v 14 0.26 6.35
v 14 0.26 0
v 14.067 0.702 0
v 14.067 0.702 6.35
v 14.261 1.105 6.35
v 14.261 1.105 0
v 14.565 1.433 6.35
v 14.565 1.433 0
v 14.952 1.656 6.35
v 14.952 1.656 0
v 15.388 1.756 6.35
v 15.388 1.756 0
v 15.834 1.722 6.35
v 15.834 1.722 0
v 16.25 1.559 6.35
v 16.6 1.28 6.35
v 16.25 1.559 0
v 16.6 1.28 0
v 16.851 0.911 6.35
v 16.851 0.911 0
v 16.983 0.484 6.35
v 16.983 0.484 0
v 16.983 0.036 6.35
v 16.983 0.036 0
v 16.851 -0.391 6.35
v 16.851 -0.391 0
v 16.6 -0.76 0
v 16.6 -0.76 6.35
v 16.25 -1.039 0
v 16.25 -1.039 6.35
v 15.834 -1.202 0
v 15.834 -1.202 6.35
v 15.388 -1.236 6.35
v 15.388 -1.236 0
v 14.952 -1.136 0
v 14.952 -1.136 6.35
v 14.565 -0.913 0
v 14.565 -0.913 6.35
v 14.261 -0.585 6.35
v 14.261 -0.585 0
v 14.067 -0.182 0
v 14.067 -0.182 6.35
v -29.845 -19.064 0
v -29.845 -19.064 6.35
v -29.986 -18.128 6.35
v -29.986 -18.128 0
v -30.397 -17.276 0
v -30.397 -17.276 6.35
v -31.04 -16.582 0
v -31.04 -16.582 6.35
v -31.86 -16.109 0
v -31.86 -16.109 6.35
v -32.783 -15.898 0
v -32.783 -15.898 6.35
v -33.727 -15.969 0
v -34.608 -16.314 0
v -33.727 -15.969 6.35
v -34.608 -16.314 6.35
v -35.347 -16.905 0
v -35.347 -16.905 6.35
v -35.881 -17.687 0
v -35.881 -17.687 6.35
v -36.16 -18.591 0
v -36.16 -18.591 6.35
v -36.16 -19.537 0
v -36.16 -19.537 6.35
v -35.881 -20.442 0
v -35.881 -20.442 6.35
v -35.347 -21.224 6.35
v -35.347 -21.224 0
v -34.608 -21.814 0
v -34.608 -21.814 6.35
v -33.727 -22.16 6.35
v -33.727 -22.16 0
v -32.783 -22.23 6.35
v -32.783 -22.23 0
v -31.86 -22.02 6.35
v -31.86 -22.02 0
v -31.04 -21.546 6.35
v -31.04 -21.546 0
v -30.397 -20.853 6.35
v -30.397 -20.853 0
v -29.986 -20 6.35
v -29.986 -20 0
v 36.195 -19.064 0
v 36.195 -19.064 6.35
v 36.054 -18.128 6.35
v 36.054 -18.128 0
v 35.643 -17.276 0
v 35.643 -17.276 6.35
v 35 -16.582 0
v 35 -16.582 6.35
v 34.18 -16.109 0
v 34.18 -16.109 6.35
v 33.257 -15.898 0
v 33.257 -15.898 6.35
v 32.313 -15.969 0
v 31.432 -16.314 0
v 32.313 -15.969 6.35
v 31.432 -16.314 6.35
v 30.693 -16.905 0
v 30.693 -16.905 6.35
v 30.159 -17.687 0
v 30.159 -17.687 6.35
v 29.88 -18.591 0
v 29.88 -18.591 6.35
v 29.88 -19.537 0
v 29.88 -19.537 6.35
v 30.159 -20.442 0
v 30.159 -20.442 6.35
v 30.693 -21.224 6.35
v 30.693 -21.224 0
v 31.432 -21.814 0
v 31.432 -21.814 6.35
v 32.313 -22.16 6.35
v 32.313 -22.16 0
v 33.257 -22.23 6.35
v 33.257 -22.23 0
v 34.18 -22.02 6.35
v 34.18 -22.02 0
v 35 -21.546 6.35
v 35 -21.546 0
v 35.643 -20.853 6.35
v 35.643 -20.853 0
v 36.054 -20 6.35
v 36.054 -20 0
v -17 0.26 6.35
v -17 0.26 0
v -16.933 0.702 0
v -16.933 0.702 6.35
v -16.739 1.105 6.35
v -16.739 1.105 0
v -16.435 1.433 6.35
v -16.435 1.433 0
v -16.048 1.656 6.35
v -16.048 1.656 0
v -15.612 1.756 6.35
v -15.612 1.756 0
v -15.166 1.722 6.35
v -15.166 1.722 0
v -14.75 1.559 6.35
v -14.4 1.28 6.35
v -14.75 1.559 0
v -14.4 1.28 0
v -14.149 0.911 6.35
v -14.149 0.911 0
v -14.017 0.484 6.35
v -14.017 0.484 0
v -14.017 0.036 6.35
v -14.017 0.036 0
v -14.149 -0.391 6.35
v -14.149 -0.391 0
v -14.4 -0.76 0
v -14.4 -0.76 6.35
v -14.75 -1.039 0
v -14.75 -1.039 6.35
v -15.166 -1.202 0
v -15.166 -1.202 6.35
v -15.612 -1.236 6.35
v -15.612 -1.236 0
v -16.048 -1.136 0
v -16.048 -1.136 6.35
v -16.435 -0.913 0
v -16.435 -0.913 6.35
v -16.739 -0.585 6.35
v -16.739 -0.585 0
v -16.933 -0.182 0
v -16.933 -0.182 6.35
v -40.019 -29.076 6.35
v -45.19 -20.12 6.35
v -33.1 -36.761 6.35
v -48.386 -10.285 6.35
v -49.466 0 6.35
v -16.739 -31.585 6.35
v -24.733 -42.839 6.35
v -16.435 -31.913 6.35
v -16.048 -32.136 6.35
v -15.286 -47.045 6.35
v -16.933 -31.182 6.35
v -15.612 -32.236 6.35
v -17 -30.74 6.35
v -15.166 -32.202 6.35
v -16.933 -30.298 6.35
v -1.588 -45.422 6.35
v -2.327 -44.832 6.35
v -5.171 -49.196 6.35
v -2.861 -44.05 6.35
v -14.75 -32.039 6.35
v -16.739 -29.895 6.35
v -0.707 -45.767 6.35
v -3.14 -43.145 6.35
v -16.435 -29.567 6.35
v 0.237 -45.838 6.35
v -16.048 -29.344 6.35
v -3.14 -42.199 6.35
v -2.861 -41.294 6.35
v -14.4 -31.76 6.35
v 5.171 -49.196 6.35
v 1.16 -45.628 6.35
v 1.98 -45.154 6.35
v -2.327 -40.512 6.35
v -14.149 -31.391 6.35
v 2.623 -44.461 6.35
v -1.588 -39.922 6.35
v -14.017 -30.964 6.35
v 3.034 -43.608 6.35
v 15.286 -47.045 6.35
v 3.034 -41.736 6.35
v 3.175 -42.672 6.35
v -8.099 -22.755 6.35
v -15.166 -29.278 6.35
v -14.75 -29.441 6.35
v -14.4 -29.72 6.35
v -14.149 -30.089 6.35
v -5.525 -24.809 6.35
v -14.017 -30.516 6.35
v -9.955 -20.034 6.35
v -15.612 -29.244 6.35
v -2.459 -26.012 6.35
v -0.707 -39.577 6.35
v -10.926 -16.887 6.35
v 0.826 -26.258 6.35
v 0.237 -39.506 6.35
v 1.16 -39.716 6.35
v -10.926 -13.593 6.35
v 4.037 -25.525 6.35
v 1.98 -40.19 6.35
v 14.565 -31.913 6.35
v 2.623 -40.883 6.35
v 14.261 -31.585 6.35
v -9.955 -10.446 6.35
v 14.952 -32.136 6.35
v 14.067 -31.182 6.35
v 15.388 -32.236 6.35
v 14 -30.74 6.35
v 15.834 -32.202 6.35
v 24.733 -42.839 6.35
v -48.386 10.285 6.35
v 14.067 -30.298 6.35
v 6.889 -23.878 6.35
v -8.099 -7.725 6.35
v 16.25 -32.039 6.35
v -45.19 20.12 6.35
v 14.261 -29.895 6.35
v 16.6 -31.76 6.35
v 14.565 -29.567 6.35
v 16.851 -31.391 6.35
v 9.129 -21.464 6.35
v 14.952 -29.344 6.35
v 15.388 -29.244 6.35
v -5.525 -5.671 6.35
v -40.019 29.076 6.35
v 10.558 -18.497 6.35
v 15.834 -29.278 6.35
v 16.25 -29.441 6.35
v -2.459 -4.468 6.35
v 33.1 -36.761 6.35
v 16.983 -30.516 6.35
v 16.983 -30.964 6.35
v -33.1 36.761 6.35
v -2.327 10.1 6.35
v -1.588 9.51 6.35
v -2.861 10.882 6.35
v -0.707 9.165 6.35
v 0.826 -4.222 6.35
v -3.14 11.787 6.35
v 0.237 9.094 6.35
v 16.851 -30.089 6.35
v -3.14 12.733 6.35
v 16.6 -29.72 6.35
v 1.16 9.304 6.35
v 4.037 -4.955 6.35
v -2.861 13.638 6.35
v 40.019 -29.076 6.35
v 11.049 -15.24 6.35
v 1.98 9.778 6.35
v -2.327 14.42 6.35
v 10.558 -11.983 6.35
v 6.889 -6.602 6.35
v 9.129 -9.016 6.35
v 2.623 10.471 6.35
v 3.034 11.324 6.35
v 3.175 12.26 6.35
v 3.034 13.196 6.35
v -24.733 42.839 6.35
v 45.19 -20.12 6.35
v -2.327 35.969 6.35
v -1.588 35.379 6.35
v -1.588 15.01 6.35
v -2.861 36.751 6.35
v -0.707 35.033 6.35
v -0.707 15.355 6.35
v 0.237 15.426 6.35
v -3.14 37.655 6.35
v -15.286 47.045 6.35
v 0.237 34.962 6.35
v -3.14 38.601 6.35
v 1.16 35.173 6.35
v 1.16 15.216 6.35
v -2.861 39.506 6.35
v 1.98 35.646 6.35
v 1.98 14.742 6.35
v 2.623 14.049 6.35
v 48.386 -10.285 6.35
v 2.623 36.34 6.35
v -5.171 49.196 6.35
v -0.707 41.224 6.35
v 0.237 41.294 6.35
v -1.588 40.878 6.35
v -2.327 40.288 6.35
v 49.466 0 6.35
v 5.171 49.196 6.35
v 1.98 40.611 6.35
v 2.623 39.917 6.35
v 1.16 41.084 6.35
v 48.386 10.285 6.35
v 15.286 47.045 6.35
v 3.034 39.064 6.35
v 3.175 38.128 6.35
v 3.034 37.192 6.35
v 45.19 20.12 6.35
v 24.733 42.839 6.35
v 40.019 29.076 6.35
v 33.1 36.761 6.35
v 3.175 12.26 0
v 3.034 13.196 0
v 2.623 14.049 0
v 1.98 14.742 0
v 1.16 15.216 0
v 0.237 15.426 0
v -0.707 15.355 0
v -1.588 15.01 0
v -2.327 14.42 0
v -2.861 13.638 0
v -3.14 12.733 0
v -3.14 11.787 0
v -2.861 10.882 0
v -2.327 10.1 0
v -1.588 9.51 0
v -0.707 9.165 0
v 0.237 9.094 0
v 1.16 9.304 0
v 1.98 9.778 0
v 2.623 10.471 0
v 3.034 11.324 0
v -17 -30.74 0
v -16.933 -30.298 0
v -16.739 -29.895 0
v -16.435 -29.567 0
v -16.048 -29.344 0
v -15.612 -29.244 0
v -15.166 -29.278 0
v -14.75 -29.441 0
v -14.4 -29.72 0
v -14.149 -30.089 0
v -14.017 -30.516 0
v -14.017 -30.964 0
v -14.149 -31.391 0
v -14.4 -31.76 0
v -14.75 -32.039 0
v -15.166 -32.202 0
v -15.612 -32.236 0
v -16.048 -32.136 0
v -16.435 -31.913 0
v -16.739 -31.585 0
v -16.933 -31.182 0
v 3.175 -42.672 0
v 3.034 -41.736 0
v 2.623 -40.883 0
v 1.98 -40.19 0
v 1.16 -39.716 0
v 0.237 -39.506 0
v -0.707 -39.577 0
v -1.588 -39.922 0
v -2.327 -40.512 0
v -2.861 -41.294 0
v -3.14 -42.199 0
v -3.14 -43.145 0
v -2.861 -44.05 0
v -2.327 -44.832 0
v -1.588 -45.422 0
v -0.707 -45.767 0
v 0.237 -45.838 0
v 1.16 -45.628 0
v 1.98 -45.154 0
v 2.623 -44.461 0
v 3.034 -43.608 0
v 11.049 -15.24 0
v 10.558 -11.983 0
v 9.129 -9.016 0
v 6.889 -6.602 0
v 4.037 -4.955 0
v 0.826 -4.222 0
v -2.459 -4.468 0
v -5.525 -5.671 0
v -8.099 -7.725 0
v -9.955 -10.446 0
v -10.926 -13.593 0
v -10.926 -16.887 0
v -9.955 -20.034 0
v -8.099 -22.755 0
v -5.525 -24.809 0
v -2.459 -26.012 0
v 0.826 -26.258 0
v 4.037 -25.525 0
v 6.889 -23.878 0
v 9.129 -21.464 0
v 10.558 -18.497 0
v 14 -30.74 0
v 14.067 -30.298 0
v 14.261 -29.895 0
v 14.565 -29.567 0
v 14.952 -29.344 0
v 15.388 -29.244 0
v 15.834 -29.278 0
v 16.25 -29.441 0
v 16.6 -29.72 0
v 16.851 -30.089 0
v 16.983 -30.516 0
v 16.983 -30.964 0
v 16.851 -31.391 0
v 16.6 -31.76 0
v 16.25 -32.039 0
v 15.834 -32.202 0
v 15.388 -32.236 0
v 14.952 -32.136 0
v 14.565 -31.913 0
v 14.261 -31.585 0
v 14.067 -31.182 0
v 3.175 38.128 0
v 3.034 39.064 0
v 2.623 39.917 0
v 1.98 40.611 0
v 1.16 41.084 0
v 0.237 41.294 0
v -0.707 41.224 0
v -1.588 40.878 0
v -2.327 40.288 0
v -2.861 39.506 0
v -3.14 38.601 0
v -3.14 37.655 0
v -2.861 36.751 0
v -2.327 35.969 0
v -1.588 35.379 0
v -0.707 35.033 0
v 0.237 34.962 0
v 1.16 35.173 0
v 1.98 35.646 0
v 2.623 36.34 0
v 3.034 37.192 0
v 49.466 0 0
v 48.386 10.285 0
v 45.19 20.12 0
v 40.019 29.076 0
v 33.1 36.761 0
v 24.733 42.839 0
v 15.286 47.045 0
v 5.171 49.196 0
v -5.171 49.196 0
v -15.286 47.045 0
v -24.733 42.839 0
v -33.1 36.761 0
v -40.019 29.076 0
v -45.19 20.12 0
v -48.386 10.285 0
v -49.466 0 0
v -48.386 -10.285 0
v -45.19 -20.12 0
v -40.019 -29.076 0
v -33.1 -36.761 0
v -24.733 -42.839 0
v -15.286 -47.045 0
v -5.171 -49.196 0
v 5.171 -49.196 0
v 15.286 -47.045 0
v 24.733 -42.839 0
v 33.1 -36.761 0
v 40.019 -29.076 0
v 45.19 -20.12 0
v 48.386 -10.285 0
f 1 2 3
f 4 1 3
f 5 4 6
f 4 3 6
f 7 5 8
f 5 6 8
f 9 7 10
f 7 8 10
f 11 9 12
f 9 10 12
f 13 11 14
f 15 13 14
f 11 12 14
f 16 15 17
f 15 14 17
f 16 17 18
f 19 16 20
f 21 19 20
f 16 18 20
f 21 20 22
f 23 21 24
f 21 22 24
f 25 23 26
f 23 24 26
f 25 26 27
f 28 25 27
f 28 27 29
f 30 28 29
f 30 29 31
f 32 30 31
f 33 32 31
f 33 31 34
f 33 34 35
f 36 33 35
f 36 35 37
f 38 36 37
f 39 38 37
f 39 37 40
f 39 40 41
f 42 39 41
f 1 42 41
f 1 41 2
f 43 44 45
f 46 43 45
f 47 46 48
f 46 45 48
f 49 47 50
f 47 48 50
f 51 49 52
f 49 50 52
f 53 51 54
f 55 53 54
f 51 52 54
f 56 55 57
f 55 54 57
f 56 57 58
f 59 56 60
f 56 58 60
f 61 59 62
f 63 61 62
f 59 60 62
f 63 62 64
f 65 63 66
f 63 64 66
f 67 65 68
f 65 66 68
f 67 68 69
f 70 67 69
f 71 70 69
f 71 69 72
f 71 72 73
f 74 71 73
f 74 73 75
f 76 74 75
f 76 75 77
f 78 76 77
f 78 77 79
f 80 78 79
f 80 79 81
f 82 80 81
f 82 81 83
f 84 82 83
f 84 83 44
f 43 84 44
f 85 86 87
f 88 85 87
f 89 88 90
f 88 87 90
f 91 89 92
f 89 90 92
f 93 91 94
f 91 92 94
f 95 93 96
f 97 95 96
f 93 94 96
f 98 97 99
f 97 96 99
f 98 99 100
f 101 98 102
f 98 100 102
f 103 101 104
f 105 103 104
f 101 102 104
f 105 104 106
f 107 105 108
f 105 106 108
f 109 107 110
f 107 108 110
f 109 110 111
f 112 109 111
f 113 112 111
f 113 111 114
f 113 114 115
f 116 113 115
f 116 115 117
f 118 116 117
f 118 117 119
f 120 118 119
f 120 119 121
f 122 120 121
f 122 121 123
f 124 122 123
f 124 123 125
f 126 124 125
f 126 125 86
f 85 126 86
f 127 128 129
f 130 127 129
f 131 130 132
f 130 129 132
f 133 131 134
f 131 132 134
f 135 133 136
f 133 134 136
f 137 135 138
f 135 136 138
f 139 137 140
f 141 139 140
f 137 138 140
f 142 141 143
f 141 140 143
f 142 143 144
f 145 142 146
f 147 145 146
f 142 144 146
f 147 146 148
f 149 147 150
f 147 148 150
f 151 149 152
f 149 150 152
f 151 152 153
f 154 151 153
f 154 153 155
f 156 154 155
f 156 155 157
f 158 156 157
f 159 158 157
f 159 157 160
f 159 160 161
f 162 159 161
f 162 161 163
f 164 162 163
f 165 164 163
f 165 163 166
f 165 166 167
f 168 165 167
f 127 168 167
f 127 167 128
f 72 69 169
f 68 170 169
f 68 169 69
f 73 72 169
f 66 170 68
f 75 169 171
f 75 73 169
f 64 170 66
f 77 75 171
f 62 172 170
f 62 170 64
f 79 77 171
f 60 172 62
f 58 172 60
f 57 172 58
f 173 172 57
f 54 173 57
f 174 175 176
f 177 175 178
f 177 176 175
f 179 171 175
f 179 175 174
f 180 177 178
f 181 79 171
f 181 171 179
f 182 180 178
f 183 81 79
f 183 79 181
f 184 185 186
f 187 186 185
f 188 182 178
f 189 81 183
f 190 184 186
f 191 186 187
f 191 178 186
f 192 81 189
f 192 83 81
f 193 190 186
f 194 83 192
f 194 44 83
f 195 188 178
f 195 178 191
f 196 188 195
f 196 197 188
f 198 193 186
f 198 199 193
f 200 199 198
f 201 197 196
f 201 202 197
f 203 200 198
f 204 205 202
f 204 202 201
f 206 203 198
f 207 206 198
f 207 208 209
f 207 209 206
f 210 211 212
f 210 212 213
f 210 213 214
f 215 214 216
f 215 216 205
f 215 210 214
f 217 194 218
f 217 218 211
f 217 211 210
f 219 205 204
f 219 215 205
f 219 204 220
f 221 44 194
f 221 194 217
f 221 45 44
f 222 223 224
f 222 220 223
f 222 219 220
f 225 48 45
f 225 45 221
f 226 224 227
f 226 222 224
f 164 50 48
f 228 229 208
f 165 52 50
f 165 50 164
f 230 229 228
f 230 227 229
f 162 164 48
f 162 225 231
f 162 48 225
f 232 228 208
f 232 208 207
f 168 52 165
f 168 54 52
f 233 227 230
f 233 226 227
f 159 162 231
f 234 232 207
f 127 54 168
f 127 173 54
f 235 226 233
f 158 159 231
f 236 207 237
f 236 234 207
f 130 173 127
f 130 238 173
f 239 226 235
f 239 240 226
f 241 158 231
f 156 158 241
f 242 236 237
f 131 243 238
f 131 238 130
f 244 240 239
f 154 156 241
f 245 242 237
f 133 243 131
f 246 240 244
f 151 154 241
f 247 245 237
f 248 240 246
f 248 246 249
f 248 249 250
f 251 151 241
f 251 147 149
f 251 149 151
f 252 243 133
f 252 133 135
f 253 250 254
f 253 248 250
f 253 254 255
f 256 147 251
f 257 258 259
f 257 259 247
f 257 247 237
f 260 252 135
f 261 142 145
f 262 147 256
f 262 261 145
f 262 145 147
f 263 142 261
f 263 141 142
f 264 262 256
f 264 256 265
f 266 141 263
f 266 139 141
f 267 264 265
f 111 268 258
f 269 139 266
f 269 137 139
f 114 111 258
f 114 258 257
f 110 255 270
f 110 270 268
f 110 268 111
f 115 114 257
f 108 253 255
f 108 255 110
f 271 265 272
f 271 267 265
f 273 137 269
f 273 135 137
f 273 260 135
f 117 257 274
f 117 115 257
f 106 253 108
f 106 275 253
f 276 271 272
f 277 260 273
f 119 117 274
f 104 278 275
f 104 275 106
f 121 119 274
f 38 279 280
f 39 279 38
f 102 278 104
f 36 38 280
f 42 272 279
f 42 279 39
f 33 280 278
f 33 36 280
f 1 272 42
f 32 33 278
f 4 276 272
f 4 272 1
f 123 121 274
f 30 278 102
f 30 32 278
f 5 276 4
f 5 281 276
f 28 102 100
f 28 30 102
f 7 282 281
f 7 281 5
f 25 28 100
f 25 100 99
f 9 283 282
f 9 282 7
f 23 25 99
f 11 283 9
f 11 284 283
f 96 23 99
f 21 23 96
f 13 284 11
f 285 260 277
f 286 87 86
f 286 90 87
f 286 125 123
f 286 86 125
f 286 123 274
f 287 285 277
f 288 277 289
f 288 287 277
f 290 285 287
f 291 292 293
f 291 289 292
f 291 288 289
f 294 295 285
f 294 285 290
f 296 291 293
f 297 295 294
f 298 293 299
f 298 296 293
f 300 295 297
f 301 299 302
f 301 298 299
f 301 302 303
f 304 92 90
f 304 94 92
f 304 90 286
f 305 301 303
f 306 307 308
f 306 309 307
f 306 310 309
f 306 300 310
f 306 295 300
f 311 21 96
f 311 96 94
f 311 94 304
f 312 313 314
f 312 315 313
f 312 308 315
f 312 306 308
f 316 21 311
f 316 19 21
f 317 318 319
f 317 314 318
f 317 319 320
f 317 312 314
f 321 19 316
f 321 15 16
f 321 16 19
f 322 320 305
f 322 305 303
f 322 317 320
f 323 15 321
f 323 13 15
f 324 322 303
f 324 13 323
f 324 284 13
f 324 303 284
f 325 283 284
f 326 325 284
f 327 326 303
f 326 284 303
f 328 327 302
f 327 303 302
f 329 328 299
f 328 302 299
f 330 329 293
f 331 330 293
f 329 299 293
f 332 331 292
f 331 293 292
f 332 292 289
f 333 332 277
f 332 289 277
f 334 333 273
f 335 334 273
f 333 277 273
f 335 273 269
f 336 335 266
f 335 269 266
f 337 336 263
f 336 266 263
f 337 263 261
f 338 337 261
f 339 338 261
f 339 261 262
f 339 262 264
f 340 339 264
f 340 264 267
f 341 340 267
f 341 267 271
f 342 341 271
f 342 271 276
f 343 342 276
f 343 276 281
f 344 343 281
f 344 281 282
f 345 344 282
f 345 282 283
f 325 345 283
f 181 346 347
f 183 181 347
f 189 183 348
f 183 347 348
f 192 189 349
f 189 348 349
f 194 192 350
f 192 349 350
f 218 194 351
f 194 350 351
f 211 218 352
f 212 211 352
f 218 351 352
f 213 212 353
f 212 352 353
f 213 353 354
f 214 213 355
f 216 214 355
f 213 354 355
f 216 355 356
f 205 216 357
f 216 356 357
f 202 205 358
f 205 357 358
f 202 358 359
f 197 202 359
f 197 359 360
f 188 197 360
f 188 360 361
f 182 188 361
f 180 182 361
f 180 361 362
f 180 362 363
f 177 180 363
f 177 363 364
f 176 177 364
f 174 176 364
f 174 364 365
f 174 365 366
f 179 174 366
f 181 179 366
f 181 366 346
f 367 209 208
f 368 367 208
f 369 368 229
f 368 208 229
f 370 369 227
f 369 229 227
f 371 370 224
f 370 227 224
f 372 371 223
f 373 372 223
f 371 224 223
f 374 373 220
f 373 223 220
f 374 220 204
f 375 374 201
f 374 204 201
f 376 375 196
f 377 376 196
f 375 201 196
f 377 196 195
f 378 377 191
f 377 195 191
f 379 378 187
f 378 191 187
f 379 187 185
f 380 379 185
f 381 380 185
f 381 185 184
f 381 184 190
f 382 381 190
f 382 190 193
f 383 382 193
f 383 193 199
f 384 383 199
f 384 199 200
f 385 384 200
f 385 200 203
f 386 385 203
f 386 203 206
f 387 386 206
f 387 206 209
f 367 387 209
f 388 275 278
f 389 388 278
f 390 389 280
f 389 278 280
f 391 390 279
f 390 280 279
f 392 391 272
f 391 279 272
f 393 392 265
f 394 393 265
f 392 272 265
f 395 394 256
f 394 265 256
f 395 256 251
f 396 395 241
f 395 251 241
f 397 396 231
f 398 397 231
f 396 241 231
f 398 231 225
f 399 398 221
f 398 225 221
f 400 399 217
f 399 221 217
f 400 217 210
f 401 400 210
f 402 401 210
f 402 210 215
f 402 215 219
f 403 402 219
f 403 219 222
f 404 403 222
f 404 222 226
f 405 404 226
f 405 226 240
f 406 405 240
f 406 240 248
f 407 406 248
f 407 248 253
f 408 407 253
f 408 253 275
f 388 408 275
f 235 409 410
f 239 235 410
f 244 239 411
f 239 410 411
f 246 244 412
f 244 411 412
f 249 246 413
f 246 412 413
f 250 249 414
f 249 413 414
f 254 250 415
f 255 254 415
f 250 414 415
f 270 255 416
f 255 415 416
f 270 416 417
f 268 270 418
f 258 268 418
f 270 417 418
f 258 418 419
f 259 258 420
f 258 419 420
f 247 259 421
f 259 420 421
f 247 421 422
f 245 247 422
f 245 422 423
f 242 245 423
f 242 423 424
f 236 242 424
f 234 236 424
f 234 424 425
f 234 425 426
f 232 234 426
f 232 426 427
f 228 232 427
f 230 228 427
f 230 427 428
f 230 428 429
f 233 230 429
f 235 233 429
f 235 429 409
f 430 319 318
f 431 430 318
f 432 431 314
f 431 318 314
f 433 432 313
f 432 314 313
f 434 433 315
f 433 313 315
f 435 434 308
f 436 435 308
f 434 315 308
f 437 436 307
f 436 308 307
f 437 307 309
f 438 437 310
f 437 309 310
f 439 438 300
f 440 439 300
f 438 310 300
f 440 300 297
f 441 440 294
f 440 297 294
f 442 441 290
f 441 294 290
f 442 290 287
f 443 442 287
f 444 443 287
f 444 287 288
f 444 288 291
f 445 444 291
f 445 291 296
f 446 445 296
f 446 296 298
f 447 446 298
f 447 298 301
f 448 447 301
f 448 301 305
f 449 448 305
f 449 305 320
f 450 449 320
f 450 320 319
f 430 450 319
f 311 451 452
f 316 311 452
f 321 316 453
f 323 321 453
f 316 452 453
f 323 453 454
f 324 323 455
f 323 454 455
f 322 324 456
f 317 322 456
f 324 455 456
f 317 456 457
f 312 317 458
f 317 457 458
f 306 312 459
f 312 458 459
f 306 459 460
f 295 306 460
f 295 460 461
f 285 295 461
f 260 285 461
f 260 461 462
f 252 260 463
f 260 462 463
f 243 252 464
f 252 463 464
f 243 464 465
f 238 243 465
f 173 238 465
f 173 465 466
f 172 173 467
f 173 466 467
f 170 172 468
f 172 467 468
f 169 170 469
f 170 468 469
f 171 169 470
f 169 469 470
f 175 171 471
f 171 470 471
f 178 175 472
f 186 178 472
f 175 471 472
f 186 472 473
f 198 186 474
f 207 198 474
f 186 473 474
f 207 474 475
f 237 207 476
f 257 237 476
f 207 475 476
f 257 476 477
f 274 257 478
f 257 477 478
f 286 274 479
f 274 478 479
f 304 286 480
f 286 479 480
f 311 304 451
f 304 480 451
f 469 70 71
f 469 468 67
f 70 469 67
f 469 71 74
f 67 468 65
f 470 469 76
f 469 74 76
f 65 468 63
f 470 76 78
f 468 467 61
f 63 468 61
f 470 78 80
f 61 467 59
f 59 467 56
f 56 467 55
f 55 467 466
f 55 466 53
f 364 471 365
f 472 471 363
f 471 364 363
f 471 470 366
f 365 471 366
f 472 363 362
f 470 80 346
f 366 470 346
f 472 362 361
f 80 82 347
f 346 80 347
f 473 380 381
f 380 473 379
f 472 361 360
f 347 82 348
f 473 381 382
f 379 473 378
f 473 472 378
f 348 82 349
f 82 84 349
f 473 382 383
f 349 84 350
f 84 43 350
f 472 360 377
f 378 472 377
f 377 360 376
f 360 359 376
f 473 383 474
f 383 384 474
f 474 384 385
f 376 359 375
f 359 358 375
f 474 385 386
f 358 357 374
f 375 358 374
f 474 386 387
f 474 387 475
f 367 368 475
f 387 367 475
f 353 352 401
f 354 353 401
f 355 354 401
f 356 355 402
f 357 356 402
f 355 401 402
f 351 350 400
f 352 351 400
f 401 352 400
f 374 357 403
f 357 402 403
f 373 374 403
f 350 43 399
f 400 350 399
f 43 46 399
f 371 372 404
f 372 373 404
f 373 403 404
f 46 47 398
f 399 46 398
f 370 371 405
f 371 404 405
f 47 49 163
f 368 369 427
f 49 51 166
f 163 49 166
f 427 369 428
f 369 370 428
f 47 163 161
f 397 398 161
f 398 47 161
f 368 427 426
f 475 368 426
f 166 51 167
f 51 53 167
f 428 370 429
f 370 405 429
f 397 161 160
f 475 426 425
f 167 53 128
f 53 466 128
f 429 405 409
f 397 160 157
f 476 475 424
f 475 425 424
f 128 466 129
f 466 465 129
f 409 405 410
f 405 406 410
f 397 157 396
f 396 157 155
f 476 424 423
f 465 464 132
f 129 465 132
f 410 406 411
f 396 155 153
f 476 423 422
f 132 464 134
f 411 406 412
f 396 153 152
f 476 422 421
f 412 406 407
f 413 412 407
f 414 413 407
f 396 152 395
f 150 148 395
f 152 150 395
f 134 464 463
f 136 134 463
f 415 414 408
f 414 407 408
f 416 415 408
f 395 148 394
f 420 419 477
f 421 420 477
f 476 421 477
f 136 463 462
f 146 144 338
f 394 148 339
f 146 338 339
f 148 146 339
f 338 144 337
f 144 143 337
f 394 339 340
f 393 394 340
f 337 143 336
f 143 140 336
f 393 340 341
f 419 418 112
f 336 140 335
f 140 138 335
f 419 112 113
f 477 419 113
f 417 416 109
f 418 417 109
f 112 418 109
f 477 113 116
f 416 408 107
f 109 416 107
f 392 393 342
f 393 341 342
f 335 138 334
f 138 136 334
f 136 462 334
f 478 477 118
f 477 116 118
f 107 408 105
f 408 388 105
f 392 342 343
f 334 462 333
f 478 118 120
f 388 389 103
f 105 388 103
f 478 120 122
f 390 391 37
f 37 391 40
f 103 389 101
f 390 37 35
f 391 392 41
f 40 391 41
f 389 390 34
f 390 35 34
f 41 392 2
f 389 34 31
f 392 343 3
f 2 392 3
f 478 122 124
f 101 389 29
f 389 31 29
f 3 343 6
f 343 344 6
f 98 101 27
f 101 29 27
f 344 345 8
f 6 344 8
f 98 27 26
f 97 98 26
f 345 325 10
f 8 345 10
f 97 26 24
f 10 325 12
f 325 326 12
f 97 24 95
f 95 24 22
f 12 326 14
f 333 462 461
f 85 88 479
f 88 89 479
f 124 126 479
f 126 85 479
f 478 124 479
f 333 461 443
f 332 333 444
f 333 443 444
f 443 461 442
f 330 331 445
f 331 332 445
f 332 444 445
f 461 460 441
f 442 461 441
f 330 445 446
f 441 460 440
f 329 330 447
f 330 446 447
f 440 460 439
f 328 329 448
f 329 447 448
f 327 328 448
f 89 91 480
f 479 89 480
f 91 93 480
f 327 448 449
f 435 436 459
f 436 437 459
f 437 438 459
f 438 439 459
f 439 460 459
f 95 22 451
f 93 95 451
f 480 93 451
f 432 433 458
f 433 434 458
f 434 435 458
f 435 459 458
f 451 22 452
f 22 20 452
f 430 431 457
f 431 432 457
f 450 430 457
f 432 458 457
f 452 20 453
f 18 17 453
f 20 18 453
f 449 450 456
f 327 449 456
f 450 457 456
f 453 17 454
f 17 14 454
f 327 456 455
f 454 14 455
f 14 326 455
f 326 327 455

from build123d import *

# Parameters (mm, degrees)
SKETCH1_R             = 49.4665
BOSS_EXTRUDE1_DEPTH   = 6.35
F_3_0MM_DOWEL_HOLE1_D = 3
SKETCH5_R             = 3.175
CUT_EXTRUDE1_DEPTH    = 71.243802179
SKETCH6_R             = 3.175
CUT_EXTRUDE2_DEPTH    = 71.243802179
SKETCH7_R             = 11.049
CUT_EXTRUDE3_DEPTH    = 71.243802179


with BuildPart() as part:
    # Sketch1 → Boss-Extrude1 (new body)
    with BuildSketch(Plane.XY):
        Circle(SKETCH1_R)
    extrude(amount=BOSS_EXTRUDE1_DEPTH)

    # Ø3.0mm Dowel Hole1 (through all)
    with Locations(Plane.XY.offset(6.35)):
        with Locations((15.5, 0.26), (-15.5, 0.26), (-15.5, -30.74), (15.5, -30.74)):
            Hole(F_3_0MM_DOWEL_HOLE1_D / 2)

    # Sketch5 → Cut-Extrude1 (cut, through all)
    with BuildSketch(Plane.XY.offset(6.35)):
        with Locations((0, -42.672)):
            Circle(SKETCH5_R)
        with Locations((0, 12.26)):
            Circle(SKETCH5_R)
    extrude(amount=-CUT_EXTRUDE1_DEPTH, mode=Mode.SUBTRACT)

    # Sketch6 → Cut-Extrude2 (cut, through all)
    with BuildSketch(Plane.XY.offset(6.35)):
        with Locations((0, 38.128211777)):
            Circle(SKETCH6_R)
        with Locations((-33.02, -19.064105889)):
            Circle(SKETCH6_R)
        with Locations((33.02, -19.064105889)):
            Circle(SKETCH6_R)
    extrude(amount=-CUT_EXTRUDE2_DEPTH, mode=Mode.SUBTRACT)

    # Sketch7 → Cut-Extrude3 (cut, through all)
    with BuildSketch(Plane.XY.offset(6.35)):
        with Locations((0, -15.24)):
            Circle(SKETCH7_R)
    extrude(amount=-CUT_EXTRUDE3_DEPTH, mode=Mode.SUBTRACT)


solid = part.part
